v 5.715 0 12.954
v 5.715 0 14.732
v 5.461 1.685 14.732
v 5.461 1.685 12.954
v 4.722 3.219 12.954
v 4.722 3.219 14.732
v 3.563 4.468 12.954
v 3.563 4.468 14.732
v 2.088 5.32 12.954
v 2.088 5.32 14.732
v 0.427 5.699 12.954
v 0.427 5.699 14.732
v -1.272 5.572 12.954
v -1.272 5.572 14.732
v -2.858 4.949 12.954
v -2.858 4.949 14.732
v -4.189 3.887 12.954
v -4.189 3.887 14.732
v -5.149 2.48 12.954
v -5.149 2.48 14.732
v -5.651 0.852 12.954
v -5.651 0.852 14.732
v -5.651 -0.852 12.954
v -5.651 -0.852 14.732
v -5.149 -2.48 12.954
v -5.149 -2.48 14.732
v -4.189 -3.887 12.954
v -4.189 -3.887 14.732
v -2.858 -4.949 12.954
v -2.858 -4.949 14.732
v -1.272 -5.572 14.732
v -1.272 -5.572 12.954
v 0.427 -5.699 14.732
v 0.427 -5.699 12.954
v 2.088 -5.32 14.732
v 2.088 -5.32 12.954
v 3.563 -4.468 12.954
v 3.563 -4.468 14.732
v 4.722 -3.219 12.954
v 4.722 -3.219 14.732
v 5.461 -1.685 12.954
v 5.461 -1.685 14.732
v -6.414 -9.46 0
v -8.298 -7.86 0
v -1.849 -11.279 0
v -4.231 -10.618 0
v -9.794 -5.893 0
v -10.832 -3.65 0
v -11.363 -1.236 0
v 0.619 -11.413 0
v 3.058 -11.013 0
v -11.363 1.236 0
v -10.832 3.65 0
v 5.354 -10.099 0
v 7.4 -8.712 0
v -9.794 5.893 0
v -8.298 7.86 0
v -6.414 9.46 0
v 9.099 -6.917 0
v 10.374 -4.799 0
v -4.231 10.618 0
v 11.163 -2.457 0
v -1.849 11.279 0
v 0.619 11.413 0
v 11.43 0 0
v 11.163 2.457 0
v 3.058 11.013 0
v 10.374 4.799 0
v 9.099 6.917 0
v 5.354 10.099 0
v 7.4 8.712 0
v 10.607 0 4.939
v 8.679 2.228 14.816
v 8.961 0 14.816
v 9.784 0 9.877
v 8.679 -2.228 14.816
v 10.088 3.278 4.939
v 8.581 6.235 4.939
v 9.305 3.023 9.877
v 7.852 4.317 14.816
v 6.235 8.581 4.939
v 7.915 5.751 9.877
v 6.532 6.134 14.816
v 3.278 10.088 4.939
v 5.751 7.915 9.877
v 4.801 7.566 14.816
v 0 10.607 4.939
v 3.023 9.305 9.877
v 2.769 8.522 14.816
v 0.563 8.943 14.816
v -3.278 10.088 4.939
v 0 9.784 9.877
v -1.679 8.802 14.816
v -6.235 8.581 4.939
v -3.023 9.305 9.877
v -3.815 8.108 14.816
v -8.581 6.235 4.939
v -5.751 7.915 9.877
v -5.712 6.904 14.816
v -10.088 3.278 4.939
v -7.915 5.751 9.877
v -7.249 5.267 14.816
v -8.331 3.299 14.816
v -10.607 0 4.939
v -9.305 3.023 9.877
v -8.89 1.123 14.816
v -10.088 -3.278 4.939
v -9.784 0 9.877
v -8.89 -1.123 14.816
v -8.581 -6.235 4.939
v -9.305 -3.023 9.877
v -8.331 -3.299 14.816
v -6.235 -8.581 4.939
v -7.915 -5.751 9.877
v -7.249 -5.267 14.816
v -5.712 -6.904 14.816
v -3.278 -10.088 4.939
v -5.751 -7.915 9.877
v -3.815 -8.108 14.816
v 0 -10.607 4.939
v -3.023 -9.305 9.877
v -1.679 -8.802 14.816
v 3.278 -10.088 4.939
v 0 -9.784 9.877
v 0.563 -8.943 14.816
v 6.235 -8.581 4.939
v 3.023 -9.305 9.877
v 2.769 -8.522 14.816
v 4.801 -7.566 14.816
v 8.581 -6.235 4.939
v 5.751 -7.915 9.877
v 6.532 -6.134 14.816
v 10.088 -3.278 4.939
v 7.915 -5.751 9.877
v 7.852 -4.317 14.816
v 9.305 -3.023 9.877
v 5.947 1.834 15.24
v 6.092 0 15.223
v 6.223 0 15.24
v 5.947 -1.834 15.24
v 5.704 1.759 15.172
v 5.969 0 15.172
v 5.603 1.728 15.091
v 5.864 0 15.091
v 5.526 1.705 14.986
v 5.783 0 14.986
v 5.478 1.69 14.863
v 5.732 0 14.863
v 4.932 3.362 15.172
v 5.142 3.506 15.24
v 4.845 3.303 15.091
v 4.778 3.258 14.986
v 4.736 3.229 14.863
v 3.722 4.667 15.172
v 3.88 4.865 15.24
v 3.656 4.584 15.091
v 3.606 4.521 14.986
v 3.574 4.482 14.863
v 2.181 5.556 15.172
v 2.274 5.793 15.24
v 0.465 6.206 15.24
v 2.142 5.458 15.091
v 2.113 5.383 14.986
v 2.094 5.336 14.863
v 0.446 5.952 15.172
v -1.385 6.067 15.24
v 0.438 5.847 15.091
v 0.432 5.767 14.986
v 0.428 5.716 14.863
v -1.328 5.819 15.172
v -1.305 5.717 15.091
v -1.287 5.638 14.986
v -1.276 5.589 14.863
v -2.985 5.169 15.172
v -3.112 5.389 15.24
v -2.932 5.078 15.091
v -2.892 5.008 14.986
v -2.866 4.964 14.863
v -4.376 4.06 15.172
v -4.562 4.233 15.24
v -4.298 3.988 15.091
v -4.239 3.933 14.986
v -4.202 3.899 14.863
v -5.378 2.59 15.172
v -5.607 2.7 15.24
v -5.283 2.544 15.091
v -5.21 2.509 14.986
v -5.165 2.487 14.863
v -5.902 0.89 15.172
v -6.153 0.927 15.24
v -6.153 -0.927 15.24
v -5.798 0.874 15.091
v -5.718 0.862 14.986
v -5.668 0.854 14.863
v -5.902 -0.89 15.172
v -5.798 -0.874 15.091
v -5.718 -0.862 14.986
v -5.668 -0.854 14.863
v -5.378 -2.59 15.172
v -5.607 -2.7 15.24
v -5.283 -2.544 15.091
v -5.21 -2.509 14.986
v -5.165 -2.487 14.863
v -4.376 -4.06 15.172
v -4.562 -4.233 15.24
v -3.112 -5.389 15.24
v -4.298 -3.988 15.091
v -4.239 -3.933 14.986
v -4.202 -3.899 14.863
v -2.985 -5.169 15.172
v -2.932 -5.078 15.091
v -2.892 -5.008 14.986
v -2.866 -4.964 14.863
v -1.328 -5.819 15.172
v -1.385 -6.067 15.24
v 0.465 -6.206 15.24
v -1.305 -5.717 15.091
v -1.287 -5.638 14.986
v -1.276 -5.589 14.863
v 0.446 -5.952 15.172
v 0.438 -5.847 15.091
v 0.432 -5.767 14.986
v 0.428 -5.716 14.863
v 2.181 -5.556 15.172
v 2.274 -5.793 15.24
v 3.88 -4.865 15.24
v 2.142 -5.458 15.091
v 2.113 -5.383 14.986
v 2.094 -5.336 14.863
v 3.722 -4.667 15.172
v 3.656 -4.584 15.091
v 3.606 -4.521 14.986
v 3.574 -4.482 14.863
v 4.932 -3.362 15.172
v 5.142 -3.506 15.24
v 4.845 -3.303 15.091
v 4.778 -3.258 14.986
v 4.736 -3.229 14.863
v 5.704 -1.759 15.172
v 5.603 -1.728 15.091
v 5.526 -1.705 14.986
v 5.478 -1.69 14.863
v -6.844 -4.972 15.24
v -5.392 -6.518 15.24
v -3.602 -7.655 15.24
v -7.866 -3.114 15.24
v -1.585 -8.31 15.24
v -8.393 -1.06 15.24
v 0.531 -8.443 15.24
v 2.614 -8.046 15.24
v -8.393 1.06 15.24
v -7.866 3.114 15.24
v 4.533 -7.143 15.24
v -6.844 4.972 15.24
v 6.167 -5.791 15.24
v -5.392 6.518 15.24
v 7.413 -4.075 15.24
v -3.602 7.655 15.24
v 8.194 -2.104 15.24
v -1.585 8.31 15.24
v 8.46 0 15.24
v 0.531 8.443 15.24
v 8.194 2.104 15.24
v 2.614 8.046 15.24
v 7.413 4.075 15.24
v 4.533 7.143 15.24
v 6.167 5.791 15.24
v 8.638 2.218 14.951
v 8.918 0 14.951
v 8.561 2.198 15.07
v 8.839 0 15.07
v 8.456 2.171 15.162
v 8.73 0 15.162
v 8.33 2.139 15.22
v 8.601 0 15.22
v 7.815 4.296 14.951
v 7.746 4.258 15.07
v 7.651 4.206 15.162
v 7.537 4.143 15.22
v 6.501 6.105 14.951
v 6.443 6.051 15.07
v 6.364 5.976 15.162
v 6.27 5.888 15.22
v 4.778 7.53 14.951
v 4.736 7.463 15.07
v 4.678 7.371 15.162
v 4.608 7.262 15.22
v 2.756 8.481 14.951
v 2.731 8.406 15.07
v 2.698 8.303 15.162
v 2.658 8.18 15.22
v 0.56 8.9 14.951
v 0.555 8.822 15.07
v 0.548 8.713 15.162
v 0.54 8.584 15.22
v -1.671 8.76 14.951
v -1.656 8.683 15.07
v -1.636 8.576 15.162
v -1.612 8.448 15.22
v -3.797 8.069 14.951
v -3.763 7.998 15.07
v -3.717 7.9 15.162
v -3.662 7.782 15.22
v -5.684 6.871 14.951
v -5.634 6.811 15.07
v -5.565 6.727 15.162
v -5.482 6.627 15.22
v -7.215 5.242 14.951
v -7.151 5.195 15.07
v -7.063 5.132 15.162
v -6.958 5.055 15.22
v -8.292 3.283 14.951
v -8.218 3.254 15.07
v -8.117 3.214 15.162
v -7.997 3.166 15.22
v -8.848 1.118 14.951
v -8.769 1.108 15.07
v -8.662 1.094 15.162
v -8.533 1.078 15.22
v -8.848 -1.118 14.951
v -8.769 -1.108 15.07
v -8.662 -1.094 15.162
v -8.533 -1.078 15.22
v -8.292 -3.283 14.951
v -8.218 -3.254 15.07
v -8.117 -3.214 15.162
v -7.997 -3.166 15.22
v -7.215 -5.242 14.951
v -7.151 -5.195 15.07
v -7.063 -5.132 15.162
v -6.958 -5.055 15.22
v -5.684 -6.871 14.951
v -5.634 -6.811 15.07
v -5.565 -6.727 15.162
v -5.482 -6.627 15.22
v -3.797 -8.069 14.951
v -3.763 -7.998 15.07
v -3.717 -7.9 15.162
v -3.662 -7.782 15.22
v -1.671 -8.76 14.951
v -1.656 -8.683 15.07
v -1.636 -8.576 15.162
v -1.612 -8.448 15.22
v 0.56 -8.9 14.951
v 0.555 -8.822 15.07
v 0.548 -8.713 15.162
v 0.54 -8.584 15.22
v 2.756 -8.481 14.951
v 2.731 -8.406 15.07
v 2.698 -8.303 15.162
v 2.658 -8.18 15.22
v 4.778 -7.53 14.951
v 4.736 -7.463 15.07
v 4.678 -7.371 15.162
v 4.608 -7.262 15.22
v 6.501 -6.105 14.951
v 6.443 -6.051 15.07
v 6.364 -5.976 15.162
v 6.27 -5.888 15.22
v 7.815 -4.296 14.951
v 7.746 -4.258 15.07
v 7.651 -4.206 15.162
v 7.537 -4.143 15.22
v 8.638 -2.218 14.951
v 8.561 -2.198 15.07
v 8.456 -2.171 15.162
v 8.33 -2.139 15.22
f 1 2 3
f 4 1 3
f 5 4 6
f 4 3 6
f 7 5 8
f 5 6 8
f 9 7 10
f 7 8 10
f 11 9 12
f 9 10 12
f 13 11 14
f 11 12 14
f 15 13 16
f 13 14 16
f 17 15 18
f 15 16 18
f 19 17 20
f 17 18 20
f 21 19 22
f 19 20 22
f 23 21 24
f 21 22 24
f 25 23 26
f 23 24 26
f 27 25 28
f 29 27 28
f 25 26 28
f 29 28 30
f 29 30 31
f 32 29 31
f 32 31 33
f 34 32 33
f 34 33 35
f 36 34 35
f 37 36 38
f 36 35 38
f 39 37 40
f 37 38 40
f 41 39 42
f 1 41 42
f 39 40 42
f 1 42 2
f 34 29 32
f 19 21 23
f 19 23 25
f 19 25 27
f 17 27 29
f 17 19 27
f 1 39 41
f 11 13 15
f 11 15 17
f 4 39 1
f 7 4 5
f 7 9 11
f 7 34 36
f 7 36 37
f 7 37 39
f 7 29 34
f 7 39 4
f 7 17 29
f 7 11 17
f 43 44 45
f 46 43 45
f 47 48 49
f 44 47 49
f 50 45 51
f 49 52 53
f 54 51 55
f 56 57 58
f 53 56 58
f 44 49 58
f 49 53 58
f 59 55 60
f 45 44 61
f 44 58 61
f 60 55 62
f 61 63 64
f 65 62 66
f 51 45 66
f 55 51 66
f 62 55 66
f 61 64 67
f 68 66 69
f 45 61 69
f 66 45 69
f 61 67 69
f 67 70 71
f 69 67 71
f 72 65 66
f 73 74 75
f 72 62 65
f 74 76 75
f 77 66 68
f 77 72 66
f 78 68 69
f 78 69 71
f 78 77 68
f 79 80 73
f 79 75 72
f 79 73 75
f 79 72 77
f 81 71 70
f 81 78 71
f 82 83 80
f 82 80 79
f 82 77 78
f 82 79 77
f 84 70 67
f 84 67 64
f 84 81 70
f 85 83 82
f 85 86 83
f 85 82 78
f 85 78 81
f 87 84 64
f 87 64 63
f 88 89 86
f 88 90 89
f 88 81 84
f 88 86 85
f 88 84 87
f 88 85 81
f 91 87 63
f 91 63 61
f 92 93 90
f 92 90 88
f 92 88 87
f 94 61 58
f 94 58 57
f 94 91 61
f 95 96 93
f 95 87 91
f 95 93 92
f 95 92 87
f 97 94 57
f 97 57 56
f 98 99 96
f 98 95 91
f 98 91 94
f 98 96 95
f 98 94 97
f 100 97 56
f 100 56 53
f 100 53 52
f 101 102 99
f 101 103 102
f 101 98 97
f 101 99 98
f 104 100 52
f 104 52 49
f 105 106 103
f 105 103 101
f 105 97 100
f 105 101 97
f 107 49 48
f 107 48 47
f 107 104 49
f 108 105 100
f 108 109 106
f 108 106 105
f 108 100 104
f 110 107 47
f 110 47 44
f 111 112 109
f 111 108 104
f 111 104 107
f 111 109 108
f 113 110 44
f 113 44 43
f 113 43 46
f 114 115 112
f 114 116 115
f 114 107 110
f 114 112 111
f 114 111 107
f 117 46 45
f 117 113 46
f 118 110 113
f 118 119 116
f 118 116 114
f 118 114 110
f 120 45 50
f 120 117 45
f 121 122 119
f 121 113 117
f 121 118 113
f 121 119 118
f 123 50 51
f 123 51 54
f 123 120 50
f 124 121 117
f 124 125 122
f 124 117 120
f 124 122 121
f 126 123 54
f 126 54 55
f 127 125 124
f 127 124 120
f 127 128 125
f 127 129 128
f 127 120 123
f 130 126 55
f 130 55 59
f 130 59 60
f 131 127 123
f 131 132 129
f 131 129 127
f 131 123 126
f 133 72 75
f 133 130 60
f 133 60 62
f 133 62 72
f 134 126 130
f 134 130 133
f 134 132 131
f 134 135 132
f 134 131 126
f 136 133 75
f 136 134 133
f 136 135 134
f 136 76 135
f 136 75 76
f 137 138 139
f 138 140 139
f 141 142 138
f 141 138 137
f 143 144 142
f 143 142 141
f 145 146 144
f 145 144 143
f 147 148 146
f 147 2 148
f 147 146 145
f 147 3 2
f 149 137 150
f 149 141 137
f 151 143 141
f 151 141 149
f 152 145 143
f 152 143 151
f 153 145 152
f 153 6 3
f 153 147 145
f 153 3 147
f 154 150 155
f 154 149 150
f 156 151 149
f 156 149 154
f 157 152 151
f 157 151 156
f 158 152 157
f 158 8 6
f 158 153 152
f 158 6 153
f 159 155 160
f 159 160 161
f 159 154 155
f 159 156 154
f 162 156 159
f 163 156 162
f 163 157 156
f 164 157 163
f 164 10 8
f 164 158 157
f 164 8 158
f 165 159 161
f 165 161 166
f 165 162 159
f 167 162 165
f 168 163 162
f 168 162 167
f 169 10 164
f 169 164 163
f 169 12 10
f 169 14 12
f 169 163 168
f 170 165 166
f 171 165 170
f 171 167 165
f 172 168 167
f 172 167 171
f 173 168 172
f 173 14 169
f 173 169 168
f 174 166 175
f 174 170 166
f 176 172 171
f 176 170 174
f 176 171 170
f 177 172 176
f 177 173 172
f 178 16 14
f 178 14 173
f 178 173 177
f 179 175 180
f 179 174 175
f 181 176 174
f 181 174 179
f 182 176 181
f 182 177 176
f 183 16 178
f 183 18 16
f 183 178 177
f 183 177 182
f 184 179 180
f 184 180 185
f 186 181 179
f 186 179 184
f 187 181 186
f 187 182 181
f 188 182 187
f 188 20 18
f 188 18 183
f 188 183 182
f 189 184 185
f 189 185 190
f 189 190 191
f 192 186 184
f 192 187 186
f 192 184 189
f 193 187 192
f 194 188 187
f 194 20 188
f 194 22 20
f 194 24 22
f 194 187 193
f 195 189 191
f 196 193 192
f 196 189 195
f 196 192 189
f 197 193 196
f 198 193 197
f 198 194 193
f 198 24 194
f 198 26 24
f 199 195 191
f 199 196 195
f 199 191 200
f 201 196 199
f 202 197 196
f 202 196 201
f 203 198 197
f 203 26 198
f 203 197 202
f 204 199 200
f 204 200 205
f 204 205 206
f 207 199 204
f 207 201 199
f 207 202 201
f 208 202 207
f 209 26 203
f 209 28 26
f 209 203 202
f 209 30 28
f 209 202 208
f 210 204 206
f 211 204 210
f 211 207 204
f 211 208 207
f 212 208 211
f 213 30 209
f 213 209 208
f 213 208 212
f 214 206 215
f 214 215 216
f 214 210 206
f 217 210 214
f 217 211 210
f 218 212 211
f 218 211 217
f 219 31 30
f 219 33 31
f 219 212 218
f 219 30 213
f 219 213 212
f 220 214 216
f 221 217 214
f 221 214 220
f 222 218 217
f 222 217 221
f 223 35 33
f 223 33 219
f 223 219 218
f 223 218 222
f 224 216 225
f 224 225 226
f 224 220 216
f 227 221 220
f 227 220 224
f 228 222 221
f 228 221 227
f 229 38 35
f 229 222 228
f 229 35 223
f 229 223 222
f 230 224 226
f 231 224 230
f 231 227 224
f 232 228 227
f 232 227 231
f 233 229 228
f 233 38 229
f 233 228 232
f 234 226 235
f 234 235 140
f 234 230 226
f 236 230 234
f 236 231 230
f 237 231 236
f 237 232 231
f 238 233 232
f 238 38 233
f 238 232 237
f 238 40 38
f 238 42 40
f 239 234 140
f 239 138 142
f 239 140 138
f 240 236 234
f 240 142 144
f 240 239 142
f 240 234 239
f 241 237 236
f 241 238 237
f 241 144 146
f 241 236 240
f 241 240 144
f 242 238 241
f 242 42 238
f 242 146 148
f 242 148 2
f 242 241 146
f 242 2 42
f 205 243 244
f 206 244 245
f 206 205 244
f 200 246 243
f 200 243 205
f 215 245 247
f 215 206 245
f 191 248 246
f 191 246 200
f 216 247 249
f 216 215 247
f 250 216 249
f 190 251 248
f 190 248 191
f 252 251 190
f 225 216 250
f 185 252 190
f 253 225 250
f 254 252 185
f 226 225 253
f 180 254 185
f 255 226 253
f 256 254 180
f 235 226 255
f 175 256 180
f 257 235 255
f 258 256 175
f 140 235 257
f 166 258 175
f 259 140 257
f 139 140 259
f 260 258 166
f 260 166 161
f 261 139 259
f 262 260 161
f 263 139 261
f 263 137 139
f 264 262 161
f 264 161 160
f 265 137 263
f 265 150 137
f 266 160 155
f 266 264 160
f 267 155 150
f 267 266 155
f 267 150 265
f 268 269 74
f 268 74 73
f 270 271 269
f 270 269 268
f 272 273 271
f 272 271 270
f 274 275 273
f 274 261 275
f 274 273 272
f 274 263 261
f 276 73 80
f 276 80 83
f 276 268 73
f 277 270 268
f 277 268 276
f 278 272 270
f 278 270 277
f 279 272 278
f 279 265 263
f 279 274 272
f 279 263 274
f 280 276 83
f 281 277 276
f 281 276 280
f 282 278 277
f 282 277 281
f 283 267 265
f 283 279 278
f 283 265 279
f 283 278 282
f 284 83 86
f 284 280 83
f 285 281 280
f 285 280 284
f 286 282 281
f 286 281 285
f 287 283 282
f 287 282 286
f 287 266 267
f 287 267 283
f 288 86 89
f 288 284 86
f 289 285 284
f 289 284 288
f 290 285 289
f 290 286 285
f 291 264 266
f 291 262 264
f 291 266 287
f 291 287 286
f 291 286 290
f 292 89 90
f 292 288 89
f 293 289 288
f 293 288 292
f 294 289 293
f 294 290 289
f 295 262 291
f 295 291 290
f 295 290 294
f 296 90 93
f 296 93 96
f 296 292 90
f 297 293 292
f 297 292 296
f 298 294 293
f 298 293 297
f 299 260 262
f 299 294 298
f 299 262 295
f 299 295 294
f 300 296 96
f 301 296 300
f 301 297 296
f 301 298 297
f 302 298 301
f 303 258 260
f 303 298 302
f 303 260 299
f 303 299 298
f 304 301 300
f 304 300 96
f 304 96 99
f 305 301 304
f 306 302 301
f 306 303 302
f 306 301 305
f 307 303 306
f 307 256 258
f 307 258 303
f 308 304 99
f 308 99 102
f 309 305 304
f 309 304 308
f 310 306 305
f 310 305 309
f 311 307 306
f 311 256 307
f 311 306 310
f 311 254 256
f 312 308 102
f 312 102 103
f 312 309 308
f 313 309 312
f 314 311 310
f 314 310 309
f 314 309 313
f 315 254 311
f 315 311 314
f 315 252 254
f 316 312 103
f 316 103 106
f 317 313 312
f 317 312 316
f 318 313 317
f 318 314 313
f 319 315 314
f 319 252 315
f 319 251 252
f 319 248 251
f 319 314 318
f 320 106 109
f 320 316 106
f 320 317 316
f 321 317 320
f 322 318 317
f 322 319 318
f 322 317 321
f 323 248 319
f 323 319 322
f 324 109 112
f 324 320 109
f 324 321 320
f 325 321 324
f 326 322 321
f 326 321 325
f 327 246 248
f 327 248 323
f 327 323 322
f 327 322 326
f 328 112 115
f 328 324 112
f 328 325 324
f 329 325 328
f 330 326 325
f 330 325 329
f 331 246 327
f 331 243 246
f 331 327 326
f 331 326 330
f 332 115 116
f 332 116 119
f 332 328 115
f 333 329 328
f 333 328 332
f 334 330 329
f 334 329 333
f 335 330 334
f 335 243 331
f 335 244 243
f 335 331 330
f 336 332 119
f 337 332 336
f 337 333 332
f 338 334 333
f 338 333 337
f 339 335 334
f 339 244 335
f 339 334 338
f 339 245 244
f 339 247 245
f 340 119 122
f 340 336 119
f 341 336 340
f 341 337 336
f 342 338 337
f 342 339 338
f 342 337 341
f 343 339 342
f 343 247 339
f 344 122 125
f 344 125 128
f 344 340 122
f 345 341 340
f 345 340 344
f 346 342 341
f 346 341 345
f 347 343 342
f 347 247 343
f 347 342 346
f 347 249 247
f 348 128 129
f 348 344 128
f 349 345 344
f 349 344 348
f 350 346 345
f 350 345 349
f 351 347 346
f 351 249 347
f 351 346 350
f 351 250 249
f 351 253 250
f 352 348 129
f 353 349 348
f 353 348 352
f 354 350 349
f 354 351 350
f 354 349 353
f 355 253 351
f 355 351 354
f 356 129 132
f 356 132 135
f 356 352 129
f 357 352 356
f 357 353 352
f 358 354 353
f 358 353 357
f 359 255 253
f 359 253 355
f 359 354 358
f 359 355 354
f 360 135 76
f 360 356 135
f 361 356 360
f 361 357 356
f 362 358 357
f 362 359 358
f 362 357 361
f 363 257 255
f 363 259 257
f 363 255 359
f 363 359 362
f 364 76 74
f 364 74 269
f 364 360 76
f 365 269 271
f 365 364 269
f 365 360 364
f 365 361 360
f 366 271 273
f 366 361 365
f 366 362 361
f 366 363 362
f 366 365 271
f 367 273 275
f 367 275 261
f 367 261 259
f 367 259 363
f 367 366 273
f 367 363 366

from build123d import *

# Parameters (mm, degrees)
F0_R     = 11.43
F2_R     = 8.89
F4_R     = 5.715
F5_DEPTH = 2.286
F6_R     = 0.508


with BuildPart() as f3:
    # F0 (on Top) → F3 section 0
    with BuildSketch(Plane.XY):
        Circle(F0_R)
    # F2 (on offset) → F3 section 1
    with BuildSketch(Plane.XY.offset(15.24)):
        Circle(F2_R)
    loft()

    # F4 (on face) → F5 (cut)
    with BuildSketch(Plane.XY.offset(15.24)):
        Circle(F4_R)
    extrude(amount=-F5_DEPTH, mode=Mode.SUBTRACT)

    # F6
    f6_edges = [f3.edges().sort_by_distance(p)[0] for p in [
        (-5.715, 0, 15.24),
        (-8.89, 0, 15.24),
    ]]
    fillet(f6_edges, radius=F6_R)


solid = f3.part
